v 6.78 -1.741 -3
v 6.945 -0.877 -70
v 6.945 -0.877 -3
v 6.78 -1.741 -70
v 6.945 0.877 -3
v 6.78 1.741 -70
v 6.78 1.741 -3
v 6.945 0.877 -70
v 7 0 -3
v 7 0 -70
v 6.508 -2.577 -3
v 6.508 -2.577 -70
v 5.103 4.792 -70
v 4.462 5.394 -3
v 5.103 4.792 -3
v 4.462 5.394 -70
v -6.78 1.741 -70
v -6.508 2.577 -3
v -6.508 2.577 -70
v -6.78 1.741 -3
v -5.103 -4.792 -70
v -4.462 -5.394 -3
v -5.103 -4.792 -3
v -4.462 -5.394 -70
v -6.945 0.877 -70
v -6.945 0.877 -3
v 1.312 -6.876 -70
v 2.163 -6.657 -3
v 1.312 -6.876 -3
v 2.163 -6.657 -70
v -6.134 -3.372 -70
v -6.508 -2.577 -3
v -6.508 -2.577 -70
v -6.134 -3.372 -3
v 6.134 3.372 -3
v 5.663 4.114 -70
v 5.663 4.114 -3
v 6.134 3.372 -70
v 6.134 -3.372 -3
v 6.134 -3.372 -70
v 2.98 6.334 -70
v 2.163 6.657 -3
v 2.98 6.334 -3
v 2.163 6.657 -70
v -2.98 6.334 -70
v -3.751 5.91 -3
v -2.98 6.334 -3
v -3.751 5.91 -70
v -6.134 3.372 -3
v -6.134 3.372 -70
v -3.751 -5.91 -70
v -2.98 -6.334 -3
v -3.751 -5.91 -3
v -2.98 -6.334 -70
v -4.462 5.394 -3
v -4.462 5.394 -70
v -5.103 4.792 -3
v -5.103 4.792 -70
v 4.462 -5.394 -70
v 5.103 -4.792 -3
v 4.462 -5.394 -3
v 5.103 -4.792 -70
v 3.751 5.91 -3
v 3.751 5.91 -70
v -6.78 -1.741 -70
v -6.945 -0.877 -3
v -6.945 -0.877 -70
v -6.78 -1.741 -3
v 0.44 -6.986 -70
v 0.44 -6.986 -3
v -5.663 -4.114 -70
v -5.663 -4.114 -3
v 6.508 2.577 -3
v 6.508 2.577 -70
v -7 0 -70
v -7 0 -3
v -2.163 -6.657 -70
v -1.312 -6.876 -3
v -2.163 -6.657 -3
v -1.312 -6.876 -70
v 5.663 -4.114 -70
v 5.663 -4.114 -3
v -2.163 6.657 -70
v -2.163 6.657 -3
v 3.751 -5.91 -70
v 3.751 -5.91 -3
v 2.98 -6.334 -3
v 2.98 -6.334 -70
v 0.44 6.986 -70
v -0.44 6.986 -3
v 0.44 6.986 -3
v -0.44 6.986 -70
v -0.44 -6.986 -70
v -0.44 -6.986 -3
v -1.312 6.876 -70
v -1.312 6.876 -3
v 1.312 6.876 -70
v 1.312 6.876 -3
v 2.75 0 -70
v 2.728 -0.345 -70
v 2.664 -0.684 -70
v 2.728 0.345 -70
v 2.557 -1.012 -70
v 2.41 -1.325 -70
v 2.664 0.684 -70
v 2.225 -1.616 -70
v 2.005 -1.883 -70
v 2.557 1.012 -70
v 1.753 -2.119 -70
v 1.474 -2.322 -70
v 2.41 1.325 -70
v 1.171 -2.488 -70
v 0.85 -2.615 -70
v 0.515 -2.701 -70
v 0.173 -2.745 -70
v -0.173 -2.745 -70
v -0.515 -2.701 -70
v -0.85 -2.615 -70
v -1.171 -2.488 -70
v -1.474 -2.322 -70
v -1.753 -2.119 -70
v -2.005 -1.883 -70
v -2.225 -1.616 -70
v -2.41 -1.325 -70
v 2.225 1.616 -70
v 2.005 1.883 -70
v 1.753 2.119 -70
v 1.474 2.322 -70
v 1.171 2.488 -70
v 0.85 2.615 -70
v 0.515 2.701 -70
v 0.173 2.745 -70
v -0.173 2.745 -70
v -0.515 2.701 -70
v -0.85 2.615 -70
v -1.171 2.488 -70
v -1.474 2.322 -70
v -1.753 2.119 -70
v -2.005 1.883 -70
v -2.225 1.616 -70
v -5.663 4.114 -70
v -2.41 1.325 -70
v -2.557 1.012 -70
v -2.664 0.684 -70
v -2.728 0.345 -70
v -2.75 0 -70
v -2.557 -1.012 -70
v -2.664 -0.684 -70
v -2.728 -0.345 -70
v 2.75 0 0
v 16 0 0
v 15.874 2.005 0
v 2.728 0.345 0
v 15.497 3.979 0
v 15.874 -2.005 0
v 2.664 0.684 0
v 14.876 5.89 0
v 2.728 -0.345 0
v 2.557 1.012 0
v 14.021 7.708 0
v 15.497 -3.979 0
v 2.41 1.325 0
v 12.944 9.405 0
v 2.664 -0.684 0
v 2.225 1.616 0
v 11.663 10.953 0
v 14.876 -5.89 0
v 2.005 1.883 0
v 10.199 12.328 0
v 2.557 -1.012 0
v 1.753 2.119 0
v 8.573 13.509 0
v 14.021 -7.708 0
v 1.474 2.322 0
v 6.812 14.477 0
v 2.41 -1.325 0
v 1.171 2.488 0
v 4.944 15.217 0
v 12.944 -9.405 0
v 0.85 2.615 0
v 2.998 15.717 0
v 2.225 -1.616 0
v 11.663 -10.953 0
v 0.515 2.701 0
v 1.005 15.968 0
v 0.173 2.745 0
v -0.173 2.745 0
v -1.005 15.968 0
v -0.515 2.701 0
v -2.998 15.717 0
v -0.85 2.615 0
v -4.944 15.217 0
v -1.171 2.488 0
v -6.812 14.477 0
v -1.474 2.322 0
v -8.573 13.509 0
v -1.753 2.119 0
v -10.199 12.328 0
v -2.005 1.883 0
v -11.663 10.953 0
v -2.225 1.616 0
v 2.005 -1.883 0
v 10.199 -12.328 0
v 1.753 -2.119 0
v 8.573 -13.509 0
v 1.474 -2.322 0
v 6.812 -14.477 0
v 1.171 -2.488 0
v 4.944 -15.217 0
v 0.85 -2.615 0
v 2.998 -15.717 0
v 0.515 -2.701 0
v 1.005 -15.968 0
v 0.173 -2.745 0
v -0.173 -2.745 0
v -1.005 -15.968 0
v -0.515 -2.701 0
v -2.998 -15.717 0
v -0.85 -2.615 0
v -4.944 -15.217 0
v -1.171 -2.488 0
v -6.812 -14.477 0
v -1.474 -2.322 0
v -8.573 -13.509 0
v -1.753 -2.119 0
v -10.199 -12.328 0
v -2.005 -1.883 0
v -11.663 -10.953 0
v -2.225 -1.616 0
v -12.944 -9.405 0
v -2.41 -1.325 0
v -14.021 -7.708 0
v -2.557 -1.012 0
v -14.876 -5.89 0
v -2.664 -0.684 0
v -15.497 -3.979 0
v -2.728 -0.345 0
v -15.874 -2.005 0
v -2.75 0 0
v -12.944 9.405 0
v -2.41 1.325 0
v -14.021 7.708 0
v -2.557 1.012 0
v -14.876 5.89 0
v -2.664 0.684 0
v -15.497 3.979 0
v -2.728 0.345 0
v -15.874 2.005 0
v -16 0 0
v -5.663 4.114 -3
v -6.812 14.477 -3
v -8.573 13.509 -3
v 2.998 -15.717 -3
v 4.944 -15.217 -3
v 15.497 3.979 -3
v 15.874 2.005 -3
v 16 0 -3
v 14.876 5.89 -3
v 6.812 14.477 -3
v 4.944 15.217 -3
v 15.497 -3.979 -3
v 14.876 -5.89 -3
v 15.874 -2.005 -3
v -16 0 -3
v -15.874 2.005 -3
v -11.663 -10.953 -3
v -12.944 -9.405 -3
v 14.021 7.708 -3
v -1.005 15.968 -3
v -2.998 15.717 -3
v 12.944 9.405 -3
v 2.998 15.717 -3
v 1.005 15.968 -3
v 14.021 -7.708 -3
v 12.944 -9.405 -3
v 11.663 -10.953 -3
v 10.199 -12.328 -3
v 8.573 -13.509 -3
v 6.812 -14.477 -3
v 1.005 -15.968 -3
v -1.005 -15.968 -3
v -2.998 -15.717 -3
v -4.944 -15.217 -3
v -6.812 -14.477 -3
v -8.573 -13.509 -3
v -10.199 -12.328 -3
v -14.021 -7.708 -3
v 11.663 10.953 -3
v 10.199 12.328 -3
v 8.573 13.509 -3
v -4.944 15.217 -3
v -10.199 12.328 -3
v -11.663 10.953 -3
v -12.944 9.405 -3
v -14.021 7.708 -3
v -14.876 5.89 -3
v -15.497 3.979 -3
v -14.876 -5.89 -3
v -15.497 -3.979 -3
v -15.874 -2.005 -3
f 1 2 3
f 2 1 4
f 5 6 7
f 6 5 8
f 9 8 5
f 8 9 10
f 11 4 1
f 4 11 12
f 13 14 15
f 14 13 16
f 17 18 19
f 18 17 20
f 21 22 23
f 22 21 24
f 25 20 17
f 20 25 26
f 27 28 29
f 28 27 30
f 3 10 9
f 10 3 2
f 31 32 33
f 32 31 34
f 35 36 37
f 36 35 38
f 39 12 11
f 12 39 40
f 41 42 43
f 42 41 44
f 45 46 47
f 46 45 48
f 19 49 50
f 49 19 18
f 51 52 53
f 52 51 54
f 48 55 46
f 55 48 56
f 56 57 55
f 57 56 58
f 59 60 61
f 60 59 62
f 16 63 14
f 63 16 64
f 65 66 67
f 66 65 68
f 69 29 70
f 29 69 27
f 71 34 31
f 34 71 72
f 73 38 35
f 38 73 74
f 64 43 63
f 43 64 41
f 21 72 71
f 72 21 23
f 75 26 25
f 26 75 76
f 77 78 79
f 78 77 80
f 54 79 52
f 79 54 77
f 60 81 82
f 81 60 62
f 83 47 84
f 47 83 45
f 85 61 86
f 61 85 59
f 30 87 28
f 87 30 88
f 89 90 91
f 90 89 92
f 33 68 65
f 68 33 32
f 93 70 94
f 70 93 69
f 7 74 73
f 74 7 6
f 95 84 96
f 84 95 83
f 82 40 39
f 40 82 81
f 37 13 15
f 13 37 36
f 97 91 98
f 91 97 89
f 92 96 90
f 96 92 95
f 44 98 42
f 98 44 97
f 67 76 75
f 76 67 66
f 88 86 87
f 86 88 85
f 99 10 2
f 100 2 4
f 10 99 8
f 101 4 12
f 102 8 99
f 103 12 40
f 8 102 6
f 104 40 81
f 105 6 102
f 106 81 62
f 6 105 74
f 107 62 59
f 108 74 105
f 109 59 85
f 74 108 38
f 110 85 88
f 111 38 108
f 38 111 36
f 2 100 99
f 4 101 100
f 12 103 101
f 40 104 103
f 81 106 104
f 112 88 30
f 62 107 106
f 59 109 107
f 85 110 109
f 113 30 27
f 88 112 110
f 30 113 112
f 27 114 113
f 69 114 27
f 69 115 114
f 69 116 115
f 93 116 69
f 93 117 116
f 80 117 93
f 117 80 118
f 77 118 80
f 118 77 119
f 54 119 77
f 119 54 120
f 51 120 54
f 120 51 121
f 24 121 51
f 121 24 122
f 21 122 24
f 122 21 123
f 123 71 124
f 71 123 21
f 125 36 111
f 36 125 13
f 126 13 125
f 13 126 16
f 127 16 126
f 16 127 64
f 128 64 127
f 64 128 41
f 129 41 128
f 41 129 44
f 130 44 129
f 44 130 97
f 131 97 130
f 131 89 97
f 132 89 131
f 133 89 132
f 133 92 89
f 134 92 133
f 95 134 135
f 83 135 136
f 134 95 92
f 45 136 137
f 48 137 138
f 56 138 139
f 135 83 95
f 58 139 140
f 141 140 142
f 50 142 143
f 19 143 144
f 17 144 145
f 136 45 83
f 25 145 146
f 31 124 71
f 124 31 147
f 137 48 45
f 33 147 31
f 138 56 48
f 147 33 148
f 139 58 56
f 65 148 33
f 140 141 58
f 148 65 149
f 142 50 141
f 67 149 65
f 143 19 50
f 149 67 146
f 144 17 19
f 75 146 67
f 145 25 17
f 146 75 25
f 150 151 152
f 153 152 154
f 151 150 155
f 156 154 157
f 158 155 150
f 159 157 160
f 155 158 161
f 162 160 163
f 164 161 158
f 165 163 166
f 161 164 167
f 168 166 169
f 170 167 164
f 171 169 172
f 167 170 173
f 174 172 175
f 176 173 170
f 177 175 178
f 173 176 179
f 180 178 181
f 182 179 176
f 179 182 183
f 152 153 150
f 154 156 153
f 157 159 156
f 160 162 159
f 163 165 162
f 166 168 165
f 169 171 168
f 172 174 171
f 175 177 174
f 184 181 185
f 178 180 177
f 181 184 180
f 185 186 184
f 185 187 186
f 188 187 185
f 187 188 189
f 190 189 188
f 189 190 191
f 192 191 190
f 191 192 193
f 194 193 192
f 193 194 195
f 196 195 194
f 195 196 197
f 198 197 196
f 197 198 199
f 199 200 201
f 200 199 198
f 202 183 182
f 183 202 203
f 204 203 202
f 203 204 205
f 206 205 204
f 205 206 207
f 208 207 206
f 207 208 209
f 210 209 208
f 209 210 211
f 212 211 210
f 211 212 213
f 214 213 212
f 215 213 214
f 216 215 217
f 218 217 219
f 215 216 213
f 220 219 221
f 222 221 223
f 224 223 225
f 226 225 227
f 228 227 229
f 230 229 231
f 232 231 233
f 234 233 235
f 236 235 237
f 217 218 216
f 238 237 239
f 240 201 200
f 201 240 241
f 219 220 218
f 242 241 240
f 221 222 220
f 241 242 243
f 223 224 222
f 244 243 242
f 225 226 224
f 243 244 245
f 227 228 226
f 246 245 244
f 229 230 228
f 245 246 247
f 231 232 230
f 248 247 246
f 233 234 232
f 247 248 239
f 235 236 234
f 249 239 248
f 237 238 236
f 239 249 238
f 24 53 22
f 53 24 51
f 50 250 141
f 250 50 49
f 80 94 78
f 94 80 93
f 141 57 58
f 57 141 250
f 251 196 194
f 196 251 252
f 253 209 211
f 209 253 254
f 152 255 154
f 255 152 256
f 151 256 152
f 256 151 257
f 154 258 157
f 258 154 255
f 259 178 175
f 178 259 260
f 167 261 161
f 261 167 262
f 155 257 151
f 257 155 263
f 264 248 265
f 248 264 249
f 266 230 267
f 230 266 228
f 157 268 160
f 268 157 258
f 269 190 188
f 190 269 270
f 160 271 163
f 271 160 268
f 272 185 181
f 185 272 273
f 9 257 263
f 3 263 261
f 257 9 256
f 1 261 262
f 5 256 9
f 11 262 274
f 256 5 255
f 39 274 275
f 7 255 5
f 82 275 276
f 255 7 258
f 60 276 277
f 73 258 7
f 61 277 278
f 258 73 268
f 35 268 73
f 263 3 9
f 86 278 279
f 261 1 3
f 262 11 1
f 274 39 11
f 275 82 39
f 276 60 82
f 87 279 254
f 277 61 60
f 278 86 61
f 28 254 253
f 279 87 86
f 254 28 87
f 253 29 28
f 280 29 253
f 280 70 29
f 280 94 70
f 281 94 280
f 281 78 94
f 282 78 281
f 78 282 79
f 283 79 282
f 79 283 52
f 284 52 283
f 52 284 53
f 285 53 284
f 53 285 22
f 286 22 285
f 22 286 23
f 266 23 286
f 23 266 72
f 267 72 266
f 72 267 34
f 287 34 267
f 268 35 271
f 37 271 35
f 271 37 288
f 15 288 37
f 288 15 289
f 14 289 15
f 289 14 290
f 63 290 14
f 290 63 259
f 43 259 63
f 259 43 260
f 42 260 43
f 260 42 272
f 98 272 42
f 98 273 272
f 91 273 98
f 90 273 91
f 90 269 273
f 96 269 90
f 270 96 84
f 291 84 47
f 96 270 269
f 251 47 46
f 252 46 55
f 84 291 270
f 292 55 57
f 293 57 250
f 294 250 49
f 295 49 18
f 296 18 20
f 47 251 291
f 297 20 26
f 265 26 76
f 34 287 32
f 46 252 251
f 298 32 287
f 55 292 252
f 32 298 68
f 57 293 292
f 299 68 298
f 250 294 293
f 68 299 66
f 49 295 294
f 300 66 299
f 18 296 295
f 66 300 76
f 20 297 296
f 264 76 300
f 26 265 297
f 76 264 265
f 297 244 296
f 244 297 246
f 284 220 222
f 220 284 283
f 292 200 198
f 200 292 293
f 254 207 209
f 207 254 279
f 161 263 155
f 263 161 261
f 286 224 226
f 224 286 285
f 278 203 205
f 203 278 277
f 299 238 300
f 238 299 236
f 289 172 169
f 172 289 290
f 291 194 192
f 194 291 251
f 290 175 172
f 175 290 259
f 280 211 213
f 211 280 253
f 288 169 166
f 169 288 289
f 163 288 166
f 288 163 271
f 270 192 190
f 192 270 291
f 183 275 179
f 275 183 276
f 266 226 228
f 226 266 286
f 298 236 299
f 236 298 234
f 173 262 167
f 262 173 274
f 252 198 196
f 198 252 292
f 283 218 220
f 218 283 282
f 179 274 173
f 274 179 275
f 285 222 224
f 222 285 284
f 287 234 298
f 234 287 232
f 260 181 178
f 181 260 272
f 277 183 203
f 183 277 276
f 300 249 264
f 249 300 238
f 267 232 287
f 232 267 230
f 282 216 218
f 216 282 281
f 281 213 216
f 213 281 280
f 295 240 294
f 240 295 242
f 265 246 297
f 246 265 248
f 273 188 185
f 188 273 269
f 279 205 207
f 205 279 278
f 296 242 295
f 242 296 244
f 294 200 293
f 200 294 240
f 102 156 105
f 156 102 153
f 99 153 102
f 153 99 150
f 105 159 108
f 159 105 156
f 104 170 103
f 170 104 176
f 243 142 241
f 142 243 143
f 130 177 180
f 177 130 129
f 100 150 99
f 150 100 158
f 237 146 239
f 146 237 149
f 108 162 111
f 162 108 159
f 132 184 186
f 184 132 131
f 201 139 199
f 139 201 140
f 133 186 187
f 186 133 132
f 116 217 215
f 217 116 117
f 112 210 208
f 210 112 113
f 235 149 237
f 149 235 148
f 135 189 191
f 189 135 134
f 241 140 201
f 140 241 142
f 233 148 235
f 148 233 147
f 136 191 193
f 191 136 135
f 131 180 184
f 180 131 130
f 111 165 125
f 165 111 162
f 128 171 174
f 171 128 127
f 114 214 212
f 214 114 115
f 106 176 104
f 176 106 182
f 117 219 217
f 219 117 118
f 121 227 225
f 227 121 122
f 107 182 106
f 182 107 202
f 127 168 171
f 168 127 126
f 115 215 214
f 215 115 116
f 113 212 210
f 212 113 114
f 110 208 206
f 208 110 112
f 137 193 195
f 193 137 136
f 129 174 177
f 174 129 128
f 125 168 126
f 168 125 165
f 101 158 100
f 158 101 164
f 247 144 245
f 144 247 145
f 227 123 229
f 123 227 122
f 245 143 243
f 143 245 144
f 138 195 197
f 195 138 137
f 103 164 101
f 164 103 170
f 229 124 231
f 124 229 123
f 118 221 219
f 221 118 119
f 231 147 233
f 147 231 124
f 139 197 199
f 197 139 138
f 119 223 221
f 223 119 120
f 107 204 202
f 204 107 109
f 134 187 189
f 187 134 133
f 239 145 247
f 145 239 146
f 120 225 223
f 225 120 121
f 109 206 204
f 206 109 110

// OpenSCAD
$fn = 50;


difference() {
	union() {
		translate(v = [0, 0, -70.0000000000]) {
			cylinder(h = 70, r = 7.0000000000);
		}
		translate(v = [0, 0, -3.0000000000]) {
			cylinder(h = 3, r = 16.0000000000);
		}
	}
	union() {
		#translate(v = [0, 0, -70]) {
			cylinder(h = 70, r = 2.7500000000);
		}
	}
}
